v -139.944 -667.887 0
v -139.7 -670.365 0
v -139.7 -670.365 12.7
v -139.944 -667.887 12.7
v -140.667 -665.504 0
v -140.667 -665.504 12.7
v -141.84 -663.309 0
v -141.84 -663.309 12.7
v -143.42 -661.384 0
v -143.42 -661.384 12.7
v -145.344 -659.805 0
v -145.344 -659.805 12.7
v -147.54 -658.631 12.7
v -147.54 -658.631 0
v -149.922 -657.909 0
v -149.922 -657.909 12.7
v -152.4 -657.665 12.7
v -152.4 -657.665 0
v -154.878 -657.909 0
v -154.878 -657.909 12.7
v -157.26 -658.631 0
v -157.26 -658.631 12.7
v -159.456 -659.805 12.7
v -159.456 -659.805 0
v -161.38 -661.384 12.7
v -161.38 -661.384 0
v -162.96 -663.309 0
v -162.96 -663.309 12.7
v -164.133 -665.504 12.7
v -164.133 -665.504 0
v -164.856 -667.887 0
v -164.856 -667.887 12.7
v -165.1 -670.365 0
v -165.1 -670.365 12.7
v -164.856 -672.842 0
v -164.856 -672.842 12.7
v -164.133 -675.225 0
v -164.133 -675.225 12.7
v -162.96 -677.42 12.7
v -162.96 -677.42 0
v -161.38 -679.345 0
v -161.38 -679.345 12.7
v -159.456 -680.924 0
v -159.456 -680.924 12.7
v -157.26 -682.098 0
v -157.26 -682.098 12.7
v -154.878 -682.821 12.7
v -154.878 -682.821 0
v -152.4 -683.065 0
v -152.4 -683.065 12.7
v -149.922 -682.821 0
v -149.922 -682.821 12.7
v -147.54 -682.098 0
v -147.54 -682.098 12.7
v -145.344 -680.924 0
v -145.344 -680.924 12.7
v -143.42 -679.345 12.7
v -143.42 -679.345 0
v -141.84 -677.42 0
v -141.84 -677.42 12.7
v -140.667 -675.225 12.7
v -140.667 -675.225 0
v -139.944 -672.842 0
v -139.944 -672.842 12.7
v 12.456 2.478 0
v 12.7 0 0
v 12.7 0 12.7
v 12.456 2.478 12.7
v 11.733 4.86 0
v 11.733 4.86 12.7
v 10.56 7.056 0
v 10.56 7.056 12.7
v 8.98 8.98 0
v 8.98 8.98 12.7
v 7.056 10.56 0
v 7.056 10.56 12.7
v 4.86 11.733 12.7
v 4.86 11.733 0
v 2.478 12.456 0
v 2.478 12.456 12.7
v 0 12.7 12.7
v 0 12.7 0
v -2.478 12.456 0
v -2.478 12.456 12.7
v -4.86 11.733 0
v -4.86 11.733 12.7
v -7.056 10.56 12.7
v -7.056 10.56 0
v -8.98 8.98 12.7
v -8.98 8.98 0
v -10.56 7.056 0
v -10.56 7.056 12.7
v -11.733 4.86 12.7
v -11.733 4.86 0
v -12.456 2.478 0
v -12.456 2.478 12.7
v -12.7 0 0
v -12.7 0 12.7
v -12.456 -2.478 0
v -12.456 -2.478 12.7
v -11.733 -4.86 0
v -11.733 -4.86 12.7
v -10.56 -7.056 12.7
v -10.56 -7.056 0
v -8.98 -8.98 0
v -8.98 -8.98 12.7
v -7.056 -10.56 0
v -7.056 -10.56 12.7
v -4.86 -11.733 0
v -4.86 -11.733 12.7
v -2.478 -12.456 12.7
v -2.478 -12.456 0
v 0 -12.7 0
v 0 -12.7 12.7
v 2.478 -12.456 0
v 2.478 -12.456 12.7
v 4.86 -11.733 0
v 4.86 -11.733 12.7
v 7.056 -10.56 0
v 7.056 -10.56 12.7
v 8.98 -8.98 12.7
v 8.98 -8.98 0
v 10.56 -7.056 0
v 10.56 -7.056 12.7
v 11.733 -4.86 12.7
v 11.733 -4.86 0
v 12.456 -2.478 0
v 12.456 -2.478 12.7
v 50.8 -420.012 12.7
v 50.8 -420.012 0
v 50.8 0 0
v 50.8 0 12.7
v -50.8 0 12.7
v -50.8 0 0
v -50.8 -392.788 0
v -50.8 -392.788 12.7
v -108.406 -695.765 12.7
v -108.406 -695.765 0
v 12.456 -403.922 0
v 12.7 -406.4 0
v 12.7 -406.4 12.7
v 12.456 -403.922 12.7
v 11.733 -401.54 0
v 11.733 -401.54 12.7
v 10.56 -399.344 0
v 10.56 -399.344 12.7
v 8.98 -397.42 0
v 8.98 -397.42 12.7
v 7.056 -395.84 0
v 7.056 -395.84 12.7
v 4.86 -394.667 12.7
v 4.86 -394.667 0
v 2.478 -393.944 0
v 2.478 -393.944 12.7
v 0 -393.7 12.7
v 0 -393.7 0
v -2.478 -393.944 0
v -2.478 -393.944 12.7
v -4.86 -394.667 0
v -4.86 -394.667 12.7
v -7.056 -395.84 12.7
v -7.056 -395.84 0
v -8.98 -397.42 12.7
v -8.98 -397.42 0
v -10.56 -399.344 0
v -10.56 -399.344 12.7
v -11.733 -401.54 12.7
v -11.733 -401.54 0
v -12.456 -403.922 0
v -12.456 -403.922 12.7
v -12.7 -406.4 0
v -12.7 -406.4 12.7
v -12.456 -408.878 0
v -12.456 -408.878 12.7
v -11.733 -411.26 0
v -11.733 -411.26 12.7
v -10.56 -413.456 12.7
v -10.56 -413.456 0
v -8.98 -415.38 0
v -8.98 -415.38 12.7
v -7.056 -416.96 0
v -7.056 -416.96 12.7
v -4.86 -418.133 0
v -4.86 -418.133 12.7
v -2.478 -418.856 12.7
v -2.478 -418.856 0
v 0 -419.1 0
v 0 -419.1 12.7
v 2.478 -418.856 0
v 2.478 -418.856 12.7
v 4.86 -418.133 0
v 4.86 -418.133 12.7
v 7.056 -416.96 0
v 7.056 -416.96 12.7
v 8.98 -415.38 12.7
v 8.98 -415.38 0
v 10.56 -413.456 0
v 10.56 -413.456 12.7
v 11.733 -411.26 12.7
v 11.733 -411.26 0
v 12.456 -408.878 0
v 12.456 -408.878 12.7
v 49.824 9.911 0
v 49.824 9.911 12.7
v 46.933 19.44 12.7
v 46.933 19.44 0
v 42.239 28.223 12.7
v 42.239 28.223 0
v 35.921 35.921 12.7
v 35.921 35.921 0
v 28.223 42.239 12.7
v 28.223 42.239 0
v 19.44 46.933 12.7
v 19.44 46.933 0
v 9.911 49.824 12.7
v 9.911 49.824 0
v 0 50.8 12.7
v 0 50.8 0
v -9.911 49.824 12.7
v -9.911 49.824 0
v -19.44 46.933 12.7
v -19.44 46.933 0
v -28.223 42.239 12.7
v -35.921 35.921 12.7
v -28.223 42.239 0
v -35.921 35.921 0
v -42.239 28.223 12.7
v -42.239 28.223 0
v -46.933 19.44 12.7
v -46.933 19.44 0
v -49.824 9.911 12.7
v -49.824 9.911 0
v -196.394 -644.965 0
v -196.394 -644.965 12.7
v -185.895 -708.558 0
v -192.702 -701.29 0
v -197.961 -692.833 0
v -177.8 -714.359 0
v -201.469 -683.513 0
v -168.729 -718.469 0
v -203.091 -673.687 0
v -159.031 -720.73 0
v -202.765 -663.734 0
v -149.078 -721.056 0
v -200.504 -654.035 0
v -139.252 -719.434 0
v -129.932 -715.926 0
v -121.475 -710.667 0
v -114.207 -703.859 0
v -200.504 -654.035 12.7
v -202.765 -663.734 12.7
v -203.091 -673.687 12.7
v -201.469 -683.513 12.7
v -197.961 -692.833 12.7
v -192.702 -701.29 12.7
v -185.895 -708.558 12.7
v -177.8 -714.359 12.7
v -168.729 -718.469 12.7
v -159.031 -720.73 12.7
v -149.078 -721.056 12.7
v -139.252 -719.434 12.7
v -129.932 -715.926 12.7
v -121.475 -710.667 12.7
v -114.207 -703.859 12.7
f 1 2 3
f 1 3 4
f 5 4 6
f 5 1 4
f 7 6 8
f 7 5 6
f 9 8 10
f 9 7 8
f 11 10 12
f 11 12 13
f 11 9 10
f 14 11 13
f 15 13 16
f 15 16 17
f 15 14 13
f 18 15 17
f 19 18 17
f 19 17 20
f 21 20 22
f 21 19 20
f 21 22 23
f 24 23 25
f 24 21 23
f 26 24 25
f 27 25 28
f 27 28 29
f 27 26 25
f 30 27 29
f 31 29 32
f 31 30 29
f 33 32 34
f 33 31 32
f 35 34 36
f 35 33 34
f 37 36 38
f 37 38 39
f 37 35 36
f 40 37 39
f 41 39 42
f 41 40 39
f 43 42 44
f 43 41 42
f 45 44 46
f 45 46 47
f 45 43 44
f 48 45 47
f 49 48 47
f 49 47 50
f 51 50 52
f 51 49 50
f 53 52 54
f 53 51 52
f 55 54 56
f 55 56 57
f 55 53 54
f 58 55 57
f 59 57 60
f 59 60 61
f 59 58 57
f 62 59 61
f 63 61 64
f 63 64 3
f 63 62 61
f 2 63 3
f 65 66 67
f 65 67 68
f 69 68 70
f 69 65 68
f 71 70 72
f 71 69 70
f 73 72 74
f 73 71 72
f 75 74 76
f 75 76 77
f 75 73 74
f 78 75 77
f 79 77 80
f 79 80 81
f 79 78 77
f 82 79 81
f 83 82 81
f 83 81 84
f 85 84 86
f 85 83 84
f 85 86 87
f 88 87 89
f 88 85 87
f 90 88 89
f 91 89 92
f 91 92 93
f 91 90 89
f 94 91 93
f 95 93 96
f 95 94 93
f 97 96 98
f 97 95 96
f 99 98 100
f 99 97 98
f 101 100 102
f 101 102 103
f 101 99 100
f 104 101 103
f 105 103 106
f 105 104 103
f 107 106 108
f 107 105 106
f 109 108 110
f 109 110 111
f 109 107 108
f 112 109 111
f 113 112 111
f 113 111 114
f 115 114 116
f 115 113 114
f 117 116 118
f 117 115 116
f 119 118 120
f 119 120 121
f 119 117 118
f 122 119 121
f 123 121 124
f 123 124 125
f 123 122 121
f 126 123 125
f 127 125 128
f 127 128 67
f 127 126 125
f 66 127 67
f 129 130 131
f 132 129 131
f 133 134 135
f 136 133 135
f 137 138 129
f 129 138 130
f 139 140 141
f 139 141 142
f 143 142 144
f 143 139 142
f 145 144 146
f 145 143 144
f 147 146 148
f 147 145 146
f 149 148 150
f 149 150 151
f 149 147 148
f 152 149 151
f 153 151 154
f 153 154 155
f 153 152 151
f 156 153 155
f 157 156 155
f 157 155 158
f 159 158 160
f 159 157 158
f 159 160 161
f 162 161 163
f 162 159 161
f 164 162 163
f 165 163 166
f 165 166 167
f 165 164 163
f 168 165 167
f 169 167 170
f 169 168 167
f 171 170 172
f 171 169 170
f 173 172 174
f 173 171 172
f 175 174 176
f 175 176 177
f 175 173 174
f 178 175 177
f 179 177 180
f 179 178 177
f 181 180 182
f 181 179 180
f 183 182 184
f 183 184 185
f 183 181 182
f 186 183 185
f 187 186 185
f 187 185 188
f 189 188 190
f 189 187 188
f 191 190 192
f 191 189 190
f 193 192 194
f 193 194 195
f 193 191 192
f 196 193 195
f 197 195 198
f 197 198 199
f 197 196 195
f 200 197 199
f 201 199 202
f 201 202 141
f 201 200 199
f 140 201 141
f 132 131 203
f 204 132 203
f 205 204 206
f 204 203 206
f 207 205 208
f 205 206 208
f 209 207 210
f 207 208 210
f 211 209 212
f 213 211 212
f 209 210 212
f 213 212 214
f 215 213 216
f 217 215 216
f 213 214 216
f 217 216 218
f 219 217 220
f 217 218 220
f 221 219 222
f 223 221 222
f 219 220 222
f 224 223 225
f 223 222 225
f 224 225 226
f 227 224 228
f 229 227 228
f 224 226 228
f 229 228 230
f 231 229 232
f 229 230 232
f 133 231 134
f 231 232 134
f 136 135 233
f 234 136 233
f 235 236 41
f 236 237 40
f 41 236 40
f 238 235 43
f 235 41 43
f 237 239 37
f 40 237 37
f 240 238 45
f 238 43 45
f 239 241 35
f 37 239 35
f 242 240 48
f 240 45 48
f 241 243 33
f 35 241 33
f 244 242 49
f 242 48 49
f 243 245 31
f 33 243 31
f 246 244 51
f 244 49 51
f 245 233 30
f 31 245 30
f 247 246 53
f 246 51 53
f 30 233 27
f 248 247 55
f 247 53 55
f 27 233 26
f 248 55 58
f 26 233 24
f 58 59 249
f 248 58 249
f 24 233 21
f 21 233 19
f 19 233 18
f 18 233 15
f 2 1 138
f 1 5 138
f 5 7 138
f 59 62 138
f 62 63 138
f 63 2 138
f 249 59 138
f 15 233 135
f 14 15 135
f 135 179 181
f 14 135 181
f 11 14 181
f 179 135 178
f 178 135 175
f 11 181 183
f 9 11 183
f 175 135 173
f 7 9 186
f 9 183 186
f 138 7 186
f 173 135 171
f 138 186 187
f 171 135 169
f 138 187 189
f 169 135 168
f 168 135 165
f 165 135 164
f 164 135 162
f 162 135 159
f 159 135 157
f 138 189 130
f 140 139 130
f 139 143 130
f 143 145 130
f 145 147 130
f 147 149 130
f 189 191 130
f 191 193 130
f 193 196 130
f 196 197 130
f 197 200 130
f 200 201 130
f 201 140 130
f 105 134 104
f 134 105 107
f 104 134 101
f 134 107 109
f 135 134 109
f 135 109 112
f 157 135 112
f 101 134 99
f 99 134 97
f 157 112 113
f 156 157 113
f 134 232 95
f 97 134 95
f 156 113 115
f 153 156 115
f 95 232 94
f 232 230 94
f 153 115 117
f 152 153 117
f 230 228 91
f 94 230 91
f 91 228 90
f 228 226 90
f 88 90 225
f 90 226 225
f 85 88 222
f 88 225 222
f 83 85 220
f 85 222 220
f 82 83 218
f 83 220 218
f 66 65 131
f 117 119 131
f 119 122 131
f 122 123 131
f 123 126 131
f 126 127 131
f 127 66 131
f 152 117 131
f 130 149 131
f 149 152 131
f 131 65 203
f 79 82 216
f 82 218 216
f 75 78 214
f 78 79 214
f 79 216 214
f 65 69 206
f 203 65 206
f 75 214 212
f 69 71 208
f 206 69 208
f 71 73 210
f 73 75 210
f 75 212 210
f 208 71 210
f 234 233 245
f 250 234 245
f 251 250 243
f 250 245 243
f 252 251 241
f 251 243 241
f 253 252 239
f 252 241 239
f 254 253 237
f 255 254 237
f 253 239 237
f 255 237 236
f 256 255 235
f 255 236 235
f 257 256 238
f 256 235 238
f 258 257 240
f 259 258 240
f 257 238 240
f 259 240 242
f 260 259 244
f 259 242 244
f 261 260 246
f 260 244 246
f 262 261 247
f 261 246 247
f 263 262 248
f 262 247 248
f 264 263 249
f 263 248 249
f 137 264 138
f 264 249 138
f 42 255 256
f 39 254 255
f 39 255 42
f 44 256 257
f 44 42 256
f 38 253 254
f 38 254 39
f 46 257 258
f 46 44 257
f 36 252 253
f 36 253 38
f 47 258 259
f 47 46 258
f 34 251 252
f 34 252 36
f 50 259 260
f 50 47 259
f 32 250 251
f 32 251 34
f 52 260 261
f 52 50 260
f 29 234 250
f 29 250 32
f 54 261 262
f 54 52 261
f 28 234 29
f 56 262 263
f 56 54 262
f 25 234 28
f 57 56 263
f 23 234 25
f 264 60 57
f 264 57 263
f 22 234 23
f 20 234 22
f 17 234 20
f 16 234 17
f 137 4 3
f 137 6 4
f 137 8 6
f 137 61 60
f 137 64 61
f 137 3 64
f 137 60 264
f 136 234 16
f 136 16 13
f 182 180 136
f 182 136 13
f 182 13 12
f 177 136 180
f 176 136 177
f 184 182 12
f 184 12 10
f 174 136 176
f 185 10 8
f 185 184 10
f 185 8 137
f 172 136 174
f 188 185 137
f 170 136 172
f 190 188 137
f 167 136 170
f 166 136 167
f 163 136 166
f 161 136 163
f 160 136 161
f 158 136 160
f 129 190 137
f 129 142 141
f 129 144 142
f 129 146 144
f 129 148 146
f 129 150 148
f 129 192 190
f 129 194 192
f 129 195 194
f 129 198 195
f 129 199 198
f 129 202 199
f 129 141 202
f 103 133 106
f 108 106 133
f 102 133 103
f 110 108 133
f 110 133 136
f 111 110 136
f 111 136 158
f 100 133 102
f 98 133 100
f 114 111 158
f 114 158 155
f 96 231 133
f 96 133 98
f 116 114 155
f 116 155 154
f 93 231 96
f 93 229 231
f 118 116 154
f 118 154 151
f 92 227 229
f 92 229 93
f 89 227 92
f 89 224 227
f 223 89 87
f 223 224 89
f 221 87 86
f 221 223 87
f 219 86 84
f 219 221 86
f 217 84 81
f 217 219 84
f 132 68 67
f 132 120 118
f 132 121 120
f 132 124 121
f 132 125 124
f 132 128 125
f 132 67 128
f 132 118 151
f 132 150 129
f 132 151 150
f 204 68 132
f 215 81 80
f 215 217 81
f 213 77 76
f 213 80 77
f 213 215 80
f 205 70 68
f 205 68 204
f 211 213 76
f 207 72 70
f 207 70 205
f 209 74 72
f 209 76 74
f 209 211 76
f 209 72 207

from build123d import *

# Parameters (mm, degrees)
SKETCH1_R           = 12.7
BOSS_EXTRUDE1_DEPTH = 12.7


with BuildPart() as part:
    # Sketch1 → Boss-Extrude1 (new body)
    with BuildSketch(Plane.XY):
        with BuildLine():
            Line((-108.405909488, -695.764543073), (50.8, -420.011818976))
            Line((50.8, -420.011818976), (50.8, 0))
            ThreePointArc((50.8, 0), (0, 50.8), (-50.8, 0))
            Line((-50.8, 0), (-50.8, -392.788181024))
            Line((-50.8, -392.788181024), (-196.394090512, -644.964543073))
            ThreePointArc((-196.394090512, -644.964543073), (-177.8, -714.358633586), (-108.405909488, -695.764543073))
        make_face()
        Circle(SKETCH1_R, mode=Mode.SUBTRACT)
        with Locations((-152.4, -670.364543073)):
            Circle(SKETCH1_R, mode=Mode.SUBTRACT)
        with Locations((0, -406.4)):
            Circle(SKETCH1_R, mode=Mode.SUBTRACT)
    extrude(amount=BOSS_EXTRUDE1_DEPTH)


solid = part.part
